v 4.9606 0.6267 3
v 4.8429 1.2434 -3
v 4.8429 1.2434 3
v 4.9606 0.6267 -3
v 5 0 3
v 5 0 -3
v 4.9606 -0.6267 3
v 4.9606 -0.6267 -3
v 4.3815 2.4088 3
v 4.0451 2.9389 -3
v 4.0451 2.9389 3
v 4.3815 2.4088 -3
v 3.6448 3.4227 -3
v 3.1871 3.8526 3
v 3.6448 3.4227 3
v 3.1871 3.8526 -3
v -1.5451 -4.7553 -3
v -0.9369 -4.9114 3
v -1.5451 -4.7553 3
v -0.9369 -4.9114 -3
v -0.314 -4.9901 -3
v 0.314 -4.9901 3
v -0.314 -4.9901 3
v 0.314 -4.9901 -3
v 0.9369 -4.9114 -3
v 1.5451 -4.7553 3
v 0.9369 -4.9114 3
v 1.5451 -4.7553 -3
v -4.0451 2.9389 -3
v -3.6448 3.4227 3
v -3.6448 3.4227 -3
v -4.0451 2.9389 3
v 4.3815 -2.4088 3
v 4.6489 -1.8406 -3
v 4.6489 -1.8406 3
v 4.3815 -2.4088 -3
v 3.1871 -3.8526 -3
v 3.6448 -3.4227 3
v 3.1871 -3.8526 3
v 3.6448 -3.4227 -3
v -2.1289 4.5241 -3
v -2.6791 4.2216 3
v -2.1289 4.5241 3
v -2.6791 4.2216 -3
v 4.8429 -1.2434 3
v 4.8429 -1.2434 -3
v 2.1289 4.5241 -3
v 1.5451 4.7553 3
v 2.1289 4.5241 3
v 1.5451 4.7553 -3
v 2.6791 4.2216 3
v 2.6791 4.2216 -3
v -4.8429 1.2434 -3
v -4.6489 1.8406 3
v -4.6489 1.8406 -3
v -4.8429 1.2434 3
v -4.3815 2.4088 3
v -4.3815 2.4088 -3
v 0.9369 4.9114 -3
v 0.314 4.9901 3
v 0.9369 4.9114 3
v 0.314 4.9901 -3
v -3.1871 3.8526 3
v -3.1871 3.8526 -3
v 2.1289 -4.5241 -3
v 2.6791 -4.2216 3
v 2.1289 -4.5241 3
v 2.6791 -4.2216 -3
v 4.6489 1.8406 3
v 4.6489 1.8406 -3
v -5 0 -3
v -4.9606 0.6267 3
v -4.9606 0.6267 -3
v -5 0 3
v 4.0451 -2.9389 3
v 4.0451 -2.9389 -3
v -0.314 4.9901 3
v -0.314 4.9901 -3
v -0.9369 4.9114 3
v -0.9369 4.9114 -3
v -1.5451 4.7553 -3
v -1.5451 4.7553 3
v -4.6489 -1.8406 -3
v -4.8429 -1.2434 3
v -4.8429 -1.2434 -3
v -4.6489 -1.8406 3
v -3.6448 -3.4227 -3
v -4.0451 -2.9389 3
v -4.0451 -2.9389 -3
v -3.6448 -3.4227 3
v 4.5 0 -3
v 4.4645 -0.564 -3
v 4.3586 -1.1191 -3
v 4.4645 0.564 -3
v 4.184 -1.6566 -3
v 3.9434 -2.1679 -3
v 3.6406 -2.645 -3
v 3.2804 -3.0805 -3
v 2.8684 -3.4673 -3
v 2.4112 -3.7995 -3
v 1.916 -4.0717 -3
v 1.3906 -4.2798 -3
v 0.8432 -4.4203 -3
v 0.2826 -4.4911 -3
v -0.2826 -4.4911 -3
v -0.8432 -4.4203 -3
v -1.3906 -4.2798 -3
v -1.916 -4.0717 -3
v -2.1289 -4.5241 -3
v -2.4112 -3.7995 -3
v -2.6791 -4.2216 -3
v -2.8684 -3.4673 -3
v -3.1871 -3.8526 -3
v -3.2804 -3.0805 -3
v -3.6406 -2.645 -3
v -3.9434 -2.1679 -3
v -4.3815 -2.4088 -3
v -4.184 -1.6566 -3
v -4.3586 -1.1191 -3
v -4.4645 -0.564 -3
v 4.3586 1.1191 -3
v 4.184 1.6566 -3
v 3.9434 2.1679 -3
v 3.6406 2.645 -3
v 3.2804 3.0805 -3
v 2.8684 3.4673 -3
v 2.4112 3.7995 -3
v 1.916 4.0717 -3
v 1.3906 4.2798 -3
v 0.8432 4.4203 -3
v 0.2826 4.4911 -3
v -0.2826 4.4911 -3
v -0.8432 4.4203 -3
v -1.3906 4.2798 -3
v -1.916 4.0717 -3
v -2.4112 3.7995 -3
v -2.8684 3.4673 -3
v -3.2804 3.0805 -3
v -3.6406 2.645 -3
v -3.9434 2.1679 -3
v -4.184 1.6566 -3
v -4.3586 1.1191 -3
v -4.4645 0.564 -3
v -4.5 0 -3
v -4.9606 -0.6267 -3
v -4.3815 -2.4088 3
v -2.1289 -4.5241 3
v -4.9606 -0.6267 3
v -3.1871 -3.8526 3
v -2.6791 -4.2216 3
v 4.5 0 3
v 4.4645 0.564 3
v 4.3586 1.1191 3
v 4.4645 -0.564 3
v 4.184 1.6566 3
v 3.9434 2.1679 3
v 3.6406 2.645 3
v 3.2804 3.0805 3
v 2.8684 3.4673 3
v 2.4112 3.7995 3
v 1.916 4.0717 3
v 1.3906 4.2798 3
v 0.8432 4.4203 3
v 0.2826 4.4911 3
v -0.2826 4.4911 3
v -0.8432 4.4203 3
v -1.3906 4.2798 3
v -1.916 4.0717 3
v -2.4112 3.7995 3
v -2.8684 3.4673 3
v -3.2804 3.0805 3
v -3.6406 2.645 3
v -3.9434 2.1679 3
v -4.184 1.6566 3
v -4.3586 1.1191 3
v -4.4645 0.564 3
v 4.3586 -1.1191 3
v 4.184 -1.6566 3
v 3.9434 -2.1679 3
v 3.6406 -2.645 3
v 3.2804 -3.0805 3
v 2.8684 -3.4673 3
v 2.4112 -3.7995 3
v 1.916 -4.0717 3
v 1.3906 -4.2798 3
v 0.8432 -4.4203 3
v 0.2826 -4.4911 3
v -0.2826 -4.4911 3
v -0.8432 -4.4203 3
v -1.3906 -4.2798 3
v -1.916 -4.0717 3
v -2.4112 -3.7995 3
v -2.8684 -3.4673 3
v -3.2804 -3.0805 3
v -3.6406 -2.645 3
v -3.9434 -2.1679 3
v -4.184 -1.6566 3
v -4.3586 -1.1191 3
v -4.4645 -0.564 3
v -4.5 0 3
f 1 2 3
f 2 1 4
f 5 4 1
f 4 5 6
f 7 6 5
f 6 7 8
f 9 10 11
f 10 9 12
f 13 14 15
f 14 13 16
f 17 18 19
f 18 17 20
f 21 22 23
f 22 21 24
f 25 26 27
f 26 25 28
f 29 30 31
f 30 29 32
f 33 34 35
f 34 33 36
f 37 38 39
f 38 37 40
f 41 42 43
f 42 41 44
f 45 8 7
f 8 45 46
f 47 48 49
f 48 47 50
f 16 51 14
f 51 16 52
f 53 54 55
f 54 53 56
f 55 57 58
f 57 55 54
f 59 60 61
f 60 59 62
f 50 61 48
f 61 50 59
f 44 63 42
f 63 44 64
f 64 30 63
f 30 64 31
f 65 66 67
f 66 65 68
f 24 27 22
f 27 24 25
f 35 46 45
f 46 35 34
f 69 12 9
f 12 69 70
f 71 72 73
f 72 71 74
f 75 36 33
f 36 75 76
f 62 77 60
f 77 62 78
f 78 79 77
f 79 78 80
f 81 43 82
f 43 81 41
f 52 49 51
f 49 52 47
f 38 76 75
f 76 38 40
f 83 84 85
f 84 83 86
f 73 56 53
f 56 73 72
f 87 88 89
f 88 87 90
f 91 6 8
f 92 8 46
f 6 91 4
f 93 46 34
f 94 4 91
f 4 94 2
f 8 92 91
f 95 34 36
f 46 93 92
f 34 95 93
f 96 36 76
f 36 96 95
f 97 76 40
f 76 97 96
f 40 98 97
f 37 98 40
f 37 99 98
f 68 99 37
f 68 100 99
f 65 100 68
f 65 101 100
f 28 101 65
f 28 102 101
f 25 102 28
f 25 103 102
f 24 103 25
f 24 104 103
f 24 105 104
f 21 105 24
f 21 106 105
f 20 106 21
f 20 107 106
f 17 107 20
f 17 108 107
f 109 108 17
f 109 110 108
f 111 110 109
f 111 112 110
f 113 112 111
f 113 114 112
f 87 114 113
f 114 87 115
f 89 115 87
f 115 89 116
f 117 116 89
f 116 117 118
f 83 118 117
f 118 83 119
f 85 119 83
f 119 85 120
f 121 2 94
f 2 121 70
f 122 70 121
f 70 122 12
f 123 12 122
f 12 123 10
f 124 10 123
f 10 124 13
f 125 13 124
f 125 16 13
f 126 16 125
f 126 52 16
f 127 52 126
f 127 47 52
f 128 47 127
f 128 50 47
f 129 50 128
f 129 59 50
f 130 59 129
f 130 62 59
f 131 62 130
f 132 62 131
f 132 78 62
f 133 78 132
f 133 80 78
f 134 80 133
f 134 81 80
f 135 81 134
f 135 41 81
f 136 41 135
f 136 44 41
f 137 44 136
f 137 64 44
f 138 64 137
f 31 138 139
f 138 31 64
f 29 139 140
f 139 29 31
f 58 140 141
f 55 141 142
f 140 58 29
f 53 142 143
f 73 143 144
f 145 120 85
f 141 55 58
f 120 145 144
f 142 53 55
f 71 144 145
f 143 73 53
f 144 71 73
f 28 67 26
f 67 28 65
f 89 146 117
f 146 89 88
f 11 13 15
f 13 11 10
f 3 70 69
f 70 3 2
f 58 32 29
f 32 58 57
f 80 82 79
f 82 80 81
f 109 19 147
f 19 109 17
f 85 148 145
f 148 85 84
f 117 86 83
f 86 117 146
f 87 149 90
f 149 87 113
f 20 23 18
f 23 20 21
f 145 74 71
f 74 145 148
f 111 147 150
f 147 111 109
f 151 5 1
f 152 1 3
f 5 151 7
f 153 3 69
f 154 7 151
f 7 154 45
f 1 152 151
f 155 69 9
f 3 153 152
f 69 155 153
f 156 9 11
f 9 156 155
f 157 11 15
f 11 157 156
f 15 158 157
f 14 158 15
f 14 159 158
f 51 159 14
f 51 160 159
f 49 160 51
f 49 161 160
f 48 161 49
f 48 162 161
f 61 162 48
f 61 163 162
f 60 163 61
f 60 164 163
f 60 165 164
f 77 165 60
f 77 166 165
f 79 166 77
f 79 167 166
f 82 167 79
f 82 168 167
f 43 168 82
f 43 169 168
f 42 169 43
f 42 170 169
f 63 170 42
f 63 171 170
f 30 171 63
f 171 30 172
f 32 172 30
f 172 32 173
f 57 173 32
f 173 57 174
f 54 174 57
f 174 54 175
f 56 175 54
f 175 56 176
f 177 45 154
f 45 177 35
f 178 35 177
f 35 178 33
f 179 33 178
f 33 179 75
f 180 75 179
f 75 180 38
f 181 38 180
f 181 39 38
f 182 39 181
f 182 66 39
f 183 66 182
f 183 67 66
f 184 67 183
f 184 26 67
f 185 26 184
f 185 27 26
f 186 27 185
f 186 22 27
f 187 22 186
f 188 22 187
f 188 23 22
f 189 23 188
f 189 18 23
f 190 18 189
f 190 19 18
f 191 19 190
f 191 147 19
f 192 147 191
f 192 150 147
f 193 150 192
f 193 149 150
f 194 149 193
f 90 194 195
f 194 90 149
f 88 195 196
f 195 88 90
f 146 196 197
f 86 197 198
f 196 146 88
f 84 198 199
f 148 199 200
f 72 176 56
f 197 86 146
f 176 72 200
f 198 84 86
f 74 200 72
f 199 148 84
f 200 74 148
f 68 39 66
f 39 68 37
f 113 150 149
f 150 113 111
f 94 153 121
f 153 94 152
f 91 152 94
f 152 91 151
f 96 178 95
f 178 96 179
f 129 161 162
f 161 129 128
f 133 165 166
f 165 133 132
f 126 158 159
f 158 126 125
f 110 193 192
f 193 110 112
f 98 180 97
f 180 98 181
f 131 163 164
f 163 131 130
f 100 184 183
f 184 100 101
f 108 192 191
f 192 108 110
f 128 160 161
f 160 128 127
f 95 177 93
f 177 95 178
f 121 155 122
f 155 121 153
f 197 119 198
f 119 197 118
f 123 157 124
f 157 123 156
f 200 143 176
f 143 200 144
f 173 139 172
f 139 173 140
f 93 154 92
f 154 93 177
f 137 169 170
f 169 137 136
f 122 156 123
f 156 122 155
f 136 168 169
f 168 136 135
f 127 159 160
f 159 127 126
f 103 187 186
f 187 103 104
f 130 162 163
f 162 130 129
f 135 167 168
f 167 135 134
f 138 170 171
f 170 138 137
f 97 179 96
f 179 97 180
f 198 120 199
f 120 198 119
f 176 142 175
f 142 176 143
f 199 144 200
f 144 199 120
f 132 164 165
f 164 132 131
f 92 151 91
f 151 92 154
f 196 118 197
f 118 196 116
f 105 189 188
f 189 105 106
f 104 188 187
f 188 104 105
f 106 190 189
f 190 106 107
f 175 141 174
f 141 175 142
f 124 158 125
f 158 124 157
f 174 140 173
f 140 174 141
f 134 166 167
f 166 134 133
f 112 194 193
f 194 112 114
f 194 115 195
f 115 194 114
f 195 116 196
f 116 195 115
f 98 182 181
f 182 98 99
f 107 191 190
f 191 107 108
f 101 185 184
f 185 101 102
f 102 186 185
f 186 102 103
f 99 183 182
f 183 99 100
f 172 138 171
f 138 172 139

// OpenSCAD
$fn = 50;


difference() {
	union() {
		translate(v = [0, 0, -3.0000000000]) {
			cylinder(h = 6, r = 5.0000000000);
		}
	}
	union() {
		translate(v = [0, 0, -100.0000000000]) {
			cylinder(h = 200, r = 4.5000000000);
		}
	}
}
